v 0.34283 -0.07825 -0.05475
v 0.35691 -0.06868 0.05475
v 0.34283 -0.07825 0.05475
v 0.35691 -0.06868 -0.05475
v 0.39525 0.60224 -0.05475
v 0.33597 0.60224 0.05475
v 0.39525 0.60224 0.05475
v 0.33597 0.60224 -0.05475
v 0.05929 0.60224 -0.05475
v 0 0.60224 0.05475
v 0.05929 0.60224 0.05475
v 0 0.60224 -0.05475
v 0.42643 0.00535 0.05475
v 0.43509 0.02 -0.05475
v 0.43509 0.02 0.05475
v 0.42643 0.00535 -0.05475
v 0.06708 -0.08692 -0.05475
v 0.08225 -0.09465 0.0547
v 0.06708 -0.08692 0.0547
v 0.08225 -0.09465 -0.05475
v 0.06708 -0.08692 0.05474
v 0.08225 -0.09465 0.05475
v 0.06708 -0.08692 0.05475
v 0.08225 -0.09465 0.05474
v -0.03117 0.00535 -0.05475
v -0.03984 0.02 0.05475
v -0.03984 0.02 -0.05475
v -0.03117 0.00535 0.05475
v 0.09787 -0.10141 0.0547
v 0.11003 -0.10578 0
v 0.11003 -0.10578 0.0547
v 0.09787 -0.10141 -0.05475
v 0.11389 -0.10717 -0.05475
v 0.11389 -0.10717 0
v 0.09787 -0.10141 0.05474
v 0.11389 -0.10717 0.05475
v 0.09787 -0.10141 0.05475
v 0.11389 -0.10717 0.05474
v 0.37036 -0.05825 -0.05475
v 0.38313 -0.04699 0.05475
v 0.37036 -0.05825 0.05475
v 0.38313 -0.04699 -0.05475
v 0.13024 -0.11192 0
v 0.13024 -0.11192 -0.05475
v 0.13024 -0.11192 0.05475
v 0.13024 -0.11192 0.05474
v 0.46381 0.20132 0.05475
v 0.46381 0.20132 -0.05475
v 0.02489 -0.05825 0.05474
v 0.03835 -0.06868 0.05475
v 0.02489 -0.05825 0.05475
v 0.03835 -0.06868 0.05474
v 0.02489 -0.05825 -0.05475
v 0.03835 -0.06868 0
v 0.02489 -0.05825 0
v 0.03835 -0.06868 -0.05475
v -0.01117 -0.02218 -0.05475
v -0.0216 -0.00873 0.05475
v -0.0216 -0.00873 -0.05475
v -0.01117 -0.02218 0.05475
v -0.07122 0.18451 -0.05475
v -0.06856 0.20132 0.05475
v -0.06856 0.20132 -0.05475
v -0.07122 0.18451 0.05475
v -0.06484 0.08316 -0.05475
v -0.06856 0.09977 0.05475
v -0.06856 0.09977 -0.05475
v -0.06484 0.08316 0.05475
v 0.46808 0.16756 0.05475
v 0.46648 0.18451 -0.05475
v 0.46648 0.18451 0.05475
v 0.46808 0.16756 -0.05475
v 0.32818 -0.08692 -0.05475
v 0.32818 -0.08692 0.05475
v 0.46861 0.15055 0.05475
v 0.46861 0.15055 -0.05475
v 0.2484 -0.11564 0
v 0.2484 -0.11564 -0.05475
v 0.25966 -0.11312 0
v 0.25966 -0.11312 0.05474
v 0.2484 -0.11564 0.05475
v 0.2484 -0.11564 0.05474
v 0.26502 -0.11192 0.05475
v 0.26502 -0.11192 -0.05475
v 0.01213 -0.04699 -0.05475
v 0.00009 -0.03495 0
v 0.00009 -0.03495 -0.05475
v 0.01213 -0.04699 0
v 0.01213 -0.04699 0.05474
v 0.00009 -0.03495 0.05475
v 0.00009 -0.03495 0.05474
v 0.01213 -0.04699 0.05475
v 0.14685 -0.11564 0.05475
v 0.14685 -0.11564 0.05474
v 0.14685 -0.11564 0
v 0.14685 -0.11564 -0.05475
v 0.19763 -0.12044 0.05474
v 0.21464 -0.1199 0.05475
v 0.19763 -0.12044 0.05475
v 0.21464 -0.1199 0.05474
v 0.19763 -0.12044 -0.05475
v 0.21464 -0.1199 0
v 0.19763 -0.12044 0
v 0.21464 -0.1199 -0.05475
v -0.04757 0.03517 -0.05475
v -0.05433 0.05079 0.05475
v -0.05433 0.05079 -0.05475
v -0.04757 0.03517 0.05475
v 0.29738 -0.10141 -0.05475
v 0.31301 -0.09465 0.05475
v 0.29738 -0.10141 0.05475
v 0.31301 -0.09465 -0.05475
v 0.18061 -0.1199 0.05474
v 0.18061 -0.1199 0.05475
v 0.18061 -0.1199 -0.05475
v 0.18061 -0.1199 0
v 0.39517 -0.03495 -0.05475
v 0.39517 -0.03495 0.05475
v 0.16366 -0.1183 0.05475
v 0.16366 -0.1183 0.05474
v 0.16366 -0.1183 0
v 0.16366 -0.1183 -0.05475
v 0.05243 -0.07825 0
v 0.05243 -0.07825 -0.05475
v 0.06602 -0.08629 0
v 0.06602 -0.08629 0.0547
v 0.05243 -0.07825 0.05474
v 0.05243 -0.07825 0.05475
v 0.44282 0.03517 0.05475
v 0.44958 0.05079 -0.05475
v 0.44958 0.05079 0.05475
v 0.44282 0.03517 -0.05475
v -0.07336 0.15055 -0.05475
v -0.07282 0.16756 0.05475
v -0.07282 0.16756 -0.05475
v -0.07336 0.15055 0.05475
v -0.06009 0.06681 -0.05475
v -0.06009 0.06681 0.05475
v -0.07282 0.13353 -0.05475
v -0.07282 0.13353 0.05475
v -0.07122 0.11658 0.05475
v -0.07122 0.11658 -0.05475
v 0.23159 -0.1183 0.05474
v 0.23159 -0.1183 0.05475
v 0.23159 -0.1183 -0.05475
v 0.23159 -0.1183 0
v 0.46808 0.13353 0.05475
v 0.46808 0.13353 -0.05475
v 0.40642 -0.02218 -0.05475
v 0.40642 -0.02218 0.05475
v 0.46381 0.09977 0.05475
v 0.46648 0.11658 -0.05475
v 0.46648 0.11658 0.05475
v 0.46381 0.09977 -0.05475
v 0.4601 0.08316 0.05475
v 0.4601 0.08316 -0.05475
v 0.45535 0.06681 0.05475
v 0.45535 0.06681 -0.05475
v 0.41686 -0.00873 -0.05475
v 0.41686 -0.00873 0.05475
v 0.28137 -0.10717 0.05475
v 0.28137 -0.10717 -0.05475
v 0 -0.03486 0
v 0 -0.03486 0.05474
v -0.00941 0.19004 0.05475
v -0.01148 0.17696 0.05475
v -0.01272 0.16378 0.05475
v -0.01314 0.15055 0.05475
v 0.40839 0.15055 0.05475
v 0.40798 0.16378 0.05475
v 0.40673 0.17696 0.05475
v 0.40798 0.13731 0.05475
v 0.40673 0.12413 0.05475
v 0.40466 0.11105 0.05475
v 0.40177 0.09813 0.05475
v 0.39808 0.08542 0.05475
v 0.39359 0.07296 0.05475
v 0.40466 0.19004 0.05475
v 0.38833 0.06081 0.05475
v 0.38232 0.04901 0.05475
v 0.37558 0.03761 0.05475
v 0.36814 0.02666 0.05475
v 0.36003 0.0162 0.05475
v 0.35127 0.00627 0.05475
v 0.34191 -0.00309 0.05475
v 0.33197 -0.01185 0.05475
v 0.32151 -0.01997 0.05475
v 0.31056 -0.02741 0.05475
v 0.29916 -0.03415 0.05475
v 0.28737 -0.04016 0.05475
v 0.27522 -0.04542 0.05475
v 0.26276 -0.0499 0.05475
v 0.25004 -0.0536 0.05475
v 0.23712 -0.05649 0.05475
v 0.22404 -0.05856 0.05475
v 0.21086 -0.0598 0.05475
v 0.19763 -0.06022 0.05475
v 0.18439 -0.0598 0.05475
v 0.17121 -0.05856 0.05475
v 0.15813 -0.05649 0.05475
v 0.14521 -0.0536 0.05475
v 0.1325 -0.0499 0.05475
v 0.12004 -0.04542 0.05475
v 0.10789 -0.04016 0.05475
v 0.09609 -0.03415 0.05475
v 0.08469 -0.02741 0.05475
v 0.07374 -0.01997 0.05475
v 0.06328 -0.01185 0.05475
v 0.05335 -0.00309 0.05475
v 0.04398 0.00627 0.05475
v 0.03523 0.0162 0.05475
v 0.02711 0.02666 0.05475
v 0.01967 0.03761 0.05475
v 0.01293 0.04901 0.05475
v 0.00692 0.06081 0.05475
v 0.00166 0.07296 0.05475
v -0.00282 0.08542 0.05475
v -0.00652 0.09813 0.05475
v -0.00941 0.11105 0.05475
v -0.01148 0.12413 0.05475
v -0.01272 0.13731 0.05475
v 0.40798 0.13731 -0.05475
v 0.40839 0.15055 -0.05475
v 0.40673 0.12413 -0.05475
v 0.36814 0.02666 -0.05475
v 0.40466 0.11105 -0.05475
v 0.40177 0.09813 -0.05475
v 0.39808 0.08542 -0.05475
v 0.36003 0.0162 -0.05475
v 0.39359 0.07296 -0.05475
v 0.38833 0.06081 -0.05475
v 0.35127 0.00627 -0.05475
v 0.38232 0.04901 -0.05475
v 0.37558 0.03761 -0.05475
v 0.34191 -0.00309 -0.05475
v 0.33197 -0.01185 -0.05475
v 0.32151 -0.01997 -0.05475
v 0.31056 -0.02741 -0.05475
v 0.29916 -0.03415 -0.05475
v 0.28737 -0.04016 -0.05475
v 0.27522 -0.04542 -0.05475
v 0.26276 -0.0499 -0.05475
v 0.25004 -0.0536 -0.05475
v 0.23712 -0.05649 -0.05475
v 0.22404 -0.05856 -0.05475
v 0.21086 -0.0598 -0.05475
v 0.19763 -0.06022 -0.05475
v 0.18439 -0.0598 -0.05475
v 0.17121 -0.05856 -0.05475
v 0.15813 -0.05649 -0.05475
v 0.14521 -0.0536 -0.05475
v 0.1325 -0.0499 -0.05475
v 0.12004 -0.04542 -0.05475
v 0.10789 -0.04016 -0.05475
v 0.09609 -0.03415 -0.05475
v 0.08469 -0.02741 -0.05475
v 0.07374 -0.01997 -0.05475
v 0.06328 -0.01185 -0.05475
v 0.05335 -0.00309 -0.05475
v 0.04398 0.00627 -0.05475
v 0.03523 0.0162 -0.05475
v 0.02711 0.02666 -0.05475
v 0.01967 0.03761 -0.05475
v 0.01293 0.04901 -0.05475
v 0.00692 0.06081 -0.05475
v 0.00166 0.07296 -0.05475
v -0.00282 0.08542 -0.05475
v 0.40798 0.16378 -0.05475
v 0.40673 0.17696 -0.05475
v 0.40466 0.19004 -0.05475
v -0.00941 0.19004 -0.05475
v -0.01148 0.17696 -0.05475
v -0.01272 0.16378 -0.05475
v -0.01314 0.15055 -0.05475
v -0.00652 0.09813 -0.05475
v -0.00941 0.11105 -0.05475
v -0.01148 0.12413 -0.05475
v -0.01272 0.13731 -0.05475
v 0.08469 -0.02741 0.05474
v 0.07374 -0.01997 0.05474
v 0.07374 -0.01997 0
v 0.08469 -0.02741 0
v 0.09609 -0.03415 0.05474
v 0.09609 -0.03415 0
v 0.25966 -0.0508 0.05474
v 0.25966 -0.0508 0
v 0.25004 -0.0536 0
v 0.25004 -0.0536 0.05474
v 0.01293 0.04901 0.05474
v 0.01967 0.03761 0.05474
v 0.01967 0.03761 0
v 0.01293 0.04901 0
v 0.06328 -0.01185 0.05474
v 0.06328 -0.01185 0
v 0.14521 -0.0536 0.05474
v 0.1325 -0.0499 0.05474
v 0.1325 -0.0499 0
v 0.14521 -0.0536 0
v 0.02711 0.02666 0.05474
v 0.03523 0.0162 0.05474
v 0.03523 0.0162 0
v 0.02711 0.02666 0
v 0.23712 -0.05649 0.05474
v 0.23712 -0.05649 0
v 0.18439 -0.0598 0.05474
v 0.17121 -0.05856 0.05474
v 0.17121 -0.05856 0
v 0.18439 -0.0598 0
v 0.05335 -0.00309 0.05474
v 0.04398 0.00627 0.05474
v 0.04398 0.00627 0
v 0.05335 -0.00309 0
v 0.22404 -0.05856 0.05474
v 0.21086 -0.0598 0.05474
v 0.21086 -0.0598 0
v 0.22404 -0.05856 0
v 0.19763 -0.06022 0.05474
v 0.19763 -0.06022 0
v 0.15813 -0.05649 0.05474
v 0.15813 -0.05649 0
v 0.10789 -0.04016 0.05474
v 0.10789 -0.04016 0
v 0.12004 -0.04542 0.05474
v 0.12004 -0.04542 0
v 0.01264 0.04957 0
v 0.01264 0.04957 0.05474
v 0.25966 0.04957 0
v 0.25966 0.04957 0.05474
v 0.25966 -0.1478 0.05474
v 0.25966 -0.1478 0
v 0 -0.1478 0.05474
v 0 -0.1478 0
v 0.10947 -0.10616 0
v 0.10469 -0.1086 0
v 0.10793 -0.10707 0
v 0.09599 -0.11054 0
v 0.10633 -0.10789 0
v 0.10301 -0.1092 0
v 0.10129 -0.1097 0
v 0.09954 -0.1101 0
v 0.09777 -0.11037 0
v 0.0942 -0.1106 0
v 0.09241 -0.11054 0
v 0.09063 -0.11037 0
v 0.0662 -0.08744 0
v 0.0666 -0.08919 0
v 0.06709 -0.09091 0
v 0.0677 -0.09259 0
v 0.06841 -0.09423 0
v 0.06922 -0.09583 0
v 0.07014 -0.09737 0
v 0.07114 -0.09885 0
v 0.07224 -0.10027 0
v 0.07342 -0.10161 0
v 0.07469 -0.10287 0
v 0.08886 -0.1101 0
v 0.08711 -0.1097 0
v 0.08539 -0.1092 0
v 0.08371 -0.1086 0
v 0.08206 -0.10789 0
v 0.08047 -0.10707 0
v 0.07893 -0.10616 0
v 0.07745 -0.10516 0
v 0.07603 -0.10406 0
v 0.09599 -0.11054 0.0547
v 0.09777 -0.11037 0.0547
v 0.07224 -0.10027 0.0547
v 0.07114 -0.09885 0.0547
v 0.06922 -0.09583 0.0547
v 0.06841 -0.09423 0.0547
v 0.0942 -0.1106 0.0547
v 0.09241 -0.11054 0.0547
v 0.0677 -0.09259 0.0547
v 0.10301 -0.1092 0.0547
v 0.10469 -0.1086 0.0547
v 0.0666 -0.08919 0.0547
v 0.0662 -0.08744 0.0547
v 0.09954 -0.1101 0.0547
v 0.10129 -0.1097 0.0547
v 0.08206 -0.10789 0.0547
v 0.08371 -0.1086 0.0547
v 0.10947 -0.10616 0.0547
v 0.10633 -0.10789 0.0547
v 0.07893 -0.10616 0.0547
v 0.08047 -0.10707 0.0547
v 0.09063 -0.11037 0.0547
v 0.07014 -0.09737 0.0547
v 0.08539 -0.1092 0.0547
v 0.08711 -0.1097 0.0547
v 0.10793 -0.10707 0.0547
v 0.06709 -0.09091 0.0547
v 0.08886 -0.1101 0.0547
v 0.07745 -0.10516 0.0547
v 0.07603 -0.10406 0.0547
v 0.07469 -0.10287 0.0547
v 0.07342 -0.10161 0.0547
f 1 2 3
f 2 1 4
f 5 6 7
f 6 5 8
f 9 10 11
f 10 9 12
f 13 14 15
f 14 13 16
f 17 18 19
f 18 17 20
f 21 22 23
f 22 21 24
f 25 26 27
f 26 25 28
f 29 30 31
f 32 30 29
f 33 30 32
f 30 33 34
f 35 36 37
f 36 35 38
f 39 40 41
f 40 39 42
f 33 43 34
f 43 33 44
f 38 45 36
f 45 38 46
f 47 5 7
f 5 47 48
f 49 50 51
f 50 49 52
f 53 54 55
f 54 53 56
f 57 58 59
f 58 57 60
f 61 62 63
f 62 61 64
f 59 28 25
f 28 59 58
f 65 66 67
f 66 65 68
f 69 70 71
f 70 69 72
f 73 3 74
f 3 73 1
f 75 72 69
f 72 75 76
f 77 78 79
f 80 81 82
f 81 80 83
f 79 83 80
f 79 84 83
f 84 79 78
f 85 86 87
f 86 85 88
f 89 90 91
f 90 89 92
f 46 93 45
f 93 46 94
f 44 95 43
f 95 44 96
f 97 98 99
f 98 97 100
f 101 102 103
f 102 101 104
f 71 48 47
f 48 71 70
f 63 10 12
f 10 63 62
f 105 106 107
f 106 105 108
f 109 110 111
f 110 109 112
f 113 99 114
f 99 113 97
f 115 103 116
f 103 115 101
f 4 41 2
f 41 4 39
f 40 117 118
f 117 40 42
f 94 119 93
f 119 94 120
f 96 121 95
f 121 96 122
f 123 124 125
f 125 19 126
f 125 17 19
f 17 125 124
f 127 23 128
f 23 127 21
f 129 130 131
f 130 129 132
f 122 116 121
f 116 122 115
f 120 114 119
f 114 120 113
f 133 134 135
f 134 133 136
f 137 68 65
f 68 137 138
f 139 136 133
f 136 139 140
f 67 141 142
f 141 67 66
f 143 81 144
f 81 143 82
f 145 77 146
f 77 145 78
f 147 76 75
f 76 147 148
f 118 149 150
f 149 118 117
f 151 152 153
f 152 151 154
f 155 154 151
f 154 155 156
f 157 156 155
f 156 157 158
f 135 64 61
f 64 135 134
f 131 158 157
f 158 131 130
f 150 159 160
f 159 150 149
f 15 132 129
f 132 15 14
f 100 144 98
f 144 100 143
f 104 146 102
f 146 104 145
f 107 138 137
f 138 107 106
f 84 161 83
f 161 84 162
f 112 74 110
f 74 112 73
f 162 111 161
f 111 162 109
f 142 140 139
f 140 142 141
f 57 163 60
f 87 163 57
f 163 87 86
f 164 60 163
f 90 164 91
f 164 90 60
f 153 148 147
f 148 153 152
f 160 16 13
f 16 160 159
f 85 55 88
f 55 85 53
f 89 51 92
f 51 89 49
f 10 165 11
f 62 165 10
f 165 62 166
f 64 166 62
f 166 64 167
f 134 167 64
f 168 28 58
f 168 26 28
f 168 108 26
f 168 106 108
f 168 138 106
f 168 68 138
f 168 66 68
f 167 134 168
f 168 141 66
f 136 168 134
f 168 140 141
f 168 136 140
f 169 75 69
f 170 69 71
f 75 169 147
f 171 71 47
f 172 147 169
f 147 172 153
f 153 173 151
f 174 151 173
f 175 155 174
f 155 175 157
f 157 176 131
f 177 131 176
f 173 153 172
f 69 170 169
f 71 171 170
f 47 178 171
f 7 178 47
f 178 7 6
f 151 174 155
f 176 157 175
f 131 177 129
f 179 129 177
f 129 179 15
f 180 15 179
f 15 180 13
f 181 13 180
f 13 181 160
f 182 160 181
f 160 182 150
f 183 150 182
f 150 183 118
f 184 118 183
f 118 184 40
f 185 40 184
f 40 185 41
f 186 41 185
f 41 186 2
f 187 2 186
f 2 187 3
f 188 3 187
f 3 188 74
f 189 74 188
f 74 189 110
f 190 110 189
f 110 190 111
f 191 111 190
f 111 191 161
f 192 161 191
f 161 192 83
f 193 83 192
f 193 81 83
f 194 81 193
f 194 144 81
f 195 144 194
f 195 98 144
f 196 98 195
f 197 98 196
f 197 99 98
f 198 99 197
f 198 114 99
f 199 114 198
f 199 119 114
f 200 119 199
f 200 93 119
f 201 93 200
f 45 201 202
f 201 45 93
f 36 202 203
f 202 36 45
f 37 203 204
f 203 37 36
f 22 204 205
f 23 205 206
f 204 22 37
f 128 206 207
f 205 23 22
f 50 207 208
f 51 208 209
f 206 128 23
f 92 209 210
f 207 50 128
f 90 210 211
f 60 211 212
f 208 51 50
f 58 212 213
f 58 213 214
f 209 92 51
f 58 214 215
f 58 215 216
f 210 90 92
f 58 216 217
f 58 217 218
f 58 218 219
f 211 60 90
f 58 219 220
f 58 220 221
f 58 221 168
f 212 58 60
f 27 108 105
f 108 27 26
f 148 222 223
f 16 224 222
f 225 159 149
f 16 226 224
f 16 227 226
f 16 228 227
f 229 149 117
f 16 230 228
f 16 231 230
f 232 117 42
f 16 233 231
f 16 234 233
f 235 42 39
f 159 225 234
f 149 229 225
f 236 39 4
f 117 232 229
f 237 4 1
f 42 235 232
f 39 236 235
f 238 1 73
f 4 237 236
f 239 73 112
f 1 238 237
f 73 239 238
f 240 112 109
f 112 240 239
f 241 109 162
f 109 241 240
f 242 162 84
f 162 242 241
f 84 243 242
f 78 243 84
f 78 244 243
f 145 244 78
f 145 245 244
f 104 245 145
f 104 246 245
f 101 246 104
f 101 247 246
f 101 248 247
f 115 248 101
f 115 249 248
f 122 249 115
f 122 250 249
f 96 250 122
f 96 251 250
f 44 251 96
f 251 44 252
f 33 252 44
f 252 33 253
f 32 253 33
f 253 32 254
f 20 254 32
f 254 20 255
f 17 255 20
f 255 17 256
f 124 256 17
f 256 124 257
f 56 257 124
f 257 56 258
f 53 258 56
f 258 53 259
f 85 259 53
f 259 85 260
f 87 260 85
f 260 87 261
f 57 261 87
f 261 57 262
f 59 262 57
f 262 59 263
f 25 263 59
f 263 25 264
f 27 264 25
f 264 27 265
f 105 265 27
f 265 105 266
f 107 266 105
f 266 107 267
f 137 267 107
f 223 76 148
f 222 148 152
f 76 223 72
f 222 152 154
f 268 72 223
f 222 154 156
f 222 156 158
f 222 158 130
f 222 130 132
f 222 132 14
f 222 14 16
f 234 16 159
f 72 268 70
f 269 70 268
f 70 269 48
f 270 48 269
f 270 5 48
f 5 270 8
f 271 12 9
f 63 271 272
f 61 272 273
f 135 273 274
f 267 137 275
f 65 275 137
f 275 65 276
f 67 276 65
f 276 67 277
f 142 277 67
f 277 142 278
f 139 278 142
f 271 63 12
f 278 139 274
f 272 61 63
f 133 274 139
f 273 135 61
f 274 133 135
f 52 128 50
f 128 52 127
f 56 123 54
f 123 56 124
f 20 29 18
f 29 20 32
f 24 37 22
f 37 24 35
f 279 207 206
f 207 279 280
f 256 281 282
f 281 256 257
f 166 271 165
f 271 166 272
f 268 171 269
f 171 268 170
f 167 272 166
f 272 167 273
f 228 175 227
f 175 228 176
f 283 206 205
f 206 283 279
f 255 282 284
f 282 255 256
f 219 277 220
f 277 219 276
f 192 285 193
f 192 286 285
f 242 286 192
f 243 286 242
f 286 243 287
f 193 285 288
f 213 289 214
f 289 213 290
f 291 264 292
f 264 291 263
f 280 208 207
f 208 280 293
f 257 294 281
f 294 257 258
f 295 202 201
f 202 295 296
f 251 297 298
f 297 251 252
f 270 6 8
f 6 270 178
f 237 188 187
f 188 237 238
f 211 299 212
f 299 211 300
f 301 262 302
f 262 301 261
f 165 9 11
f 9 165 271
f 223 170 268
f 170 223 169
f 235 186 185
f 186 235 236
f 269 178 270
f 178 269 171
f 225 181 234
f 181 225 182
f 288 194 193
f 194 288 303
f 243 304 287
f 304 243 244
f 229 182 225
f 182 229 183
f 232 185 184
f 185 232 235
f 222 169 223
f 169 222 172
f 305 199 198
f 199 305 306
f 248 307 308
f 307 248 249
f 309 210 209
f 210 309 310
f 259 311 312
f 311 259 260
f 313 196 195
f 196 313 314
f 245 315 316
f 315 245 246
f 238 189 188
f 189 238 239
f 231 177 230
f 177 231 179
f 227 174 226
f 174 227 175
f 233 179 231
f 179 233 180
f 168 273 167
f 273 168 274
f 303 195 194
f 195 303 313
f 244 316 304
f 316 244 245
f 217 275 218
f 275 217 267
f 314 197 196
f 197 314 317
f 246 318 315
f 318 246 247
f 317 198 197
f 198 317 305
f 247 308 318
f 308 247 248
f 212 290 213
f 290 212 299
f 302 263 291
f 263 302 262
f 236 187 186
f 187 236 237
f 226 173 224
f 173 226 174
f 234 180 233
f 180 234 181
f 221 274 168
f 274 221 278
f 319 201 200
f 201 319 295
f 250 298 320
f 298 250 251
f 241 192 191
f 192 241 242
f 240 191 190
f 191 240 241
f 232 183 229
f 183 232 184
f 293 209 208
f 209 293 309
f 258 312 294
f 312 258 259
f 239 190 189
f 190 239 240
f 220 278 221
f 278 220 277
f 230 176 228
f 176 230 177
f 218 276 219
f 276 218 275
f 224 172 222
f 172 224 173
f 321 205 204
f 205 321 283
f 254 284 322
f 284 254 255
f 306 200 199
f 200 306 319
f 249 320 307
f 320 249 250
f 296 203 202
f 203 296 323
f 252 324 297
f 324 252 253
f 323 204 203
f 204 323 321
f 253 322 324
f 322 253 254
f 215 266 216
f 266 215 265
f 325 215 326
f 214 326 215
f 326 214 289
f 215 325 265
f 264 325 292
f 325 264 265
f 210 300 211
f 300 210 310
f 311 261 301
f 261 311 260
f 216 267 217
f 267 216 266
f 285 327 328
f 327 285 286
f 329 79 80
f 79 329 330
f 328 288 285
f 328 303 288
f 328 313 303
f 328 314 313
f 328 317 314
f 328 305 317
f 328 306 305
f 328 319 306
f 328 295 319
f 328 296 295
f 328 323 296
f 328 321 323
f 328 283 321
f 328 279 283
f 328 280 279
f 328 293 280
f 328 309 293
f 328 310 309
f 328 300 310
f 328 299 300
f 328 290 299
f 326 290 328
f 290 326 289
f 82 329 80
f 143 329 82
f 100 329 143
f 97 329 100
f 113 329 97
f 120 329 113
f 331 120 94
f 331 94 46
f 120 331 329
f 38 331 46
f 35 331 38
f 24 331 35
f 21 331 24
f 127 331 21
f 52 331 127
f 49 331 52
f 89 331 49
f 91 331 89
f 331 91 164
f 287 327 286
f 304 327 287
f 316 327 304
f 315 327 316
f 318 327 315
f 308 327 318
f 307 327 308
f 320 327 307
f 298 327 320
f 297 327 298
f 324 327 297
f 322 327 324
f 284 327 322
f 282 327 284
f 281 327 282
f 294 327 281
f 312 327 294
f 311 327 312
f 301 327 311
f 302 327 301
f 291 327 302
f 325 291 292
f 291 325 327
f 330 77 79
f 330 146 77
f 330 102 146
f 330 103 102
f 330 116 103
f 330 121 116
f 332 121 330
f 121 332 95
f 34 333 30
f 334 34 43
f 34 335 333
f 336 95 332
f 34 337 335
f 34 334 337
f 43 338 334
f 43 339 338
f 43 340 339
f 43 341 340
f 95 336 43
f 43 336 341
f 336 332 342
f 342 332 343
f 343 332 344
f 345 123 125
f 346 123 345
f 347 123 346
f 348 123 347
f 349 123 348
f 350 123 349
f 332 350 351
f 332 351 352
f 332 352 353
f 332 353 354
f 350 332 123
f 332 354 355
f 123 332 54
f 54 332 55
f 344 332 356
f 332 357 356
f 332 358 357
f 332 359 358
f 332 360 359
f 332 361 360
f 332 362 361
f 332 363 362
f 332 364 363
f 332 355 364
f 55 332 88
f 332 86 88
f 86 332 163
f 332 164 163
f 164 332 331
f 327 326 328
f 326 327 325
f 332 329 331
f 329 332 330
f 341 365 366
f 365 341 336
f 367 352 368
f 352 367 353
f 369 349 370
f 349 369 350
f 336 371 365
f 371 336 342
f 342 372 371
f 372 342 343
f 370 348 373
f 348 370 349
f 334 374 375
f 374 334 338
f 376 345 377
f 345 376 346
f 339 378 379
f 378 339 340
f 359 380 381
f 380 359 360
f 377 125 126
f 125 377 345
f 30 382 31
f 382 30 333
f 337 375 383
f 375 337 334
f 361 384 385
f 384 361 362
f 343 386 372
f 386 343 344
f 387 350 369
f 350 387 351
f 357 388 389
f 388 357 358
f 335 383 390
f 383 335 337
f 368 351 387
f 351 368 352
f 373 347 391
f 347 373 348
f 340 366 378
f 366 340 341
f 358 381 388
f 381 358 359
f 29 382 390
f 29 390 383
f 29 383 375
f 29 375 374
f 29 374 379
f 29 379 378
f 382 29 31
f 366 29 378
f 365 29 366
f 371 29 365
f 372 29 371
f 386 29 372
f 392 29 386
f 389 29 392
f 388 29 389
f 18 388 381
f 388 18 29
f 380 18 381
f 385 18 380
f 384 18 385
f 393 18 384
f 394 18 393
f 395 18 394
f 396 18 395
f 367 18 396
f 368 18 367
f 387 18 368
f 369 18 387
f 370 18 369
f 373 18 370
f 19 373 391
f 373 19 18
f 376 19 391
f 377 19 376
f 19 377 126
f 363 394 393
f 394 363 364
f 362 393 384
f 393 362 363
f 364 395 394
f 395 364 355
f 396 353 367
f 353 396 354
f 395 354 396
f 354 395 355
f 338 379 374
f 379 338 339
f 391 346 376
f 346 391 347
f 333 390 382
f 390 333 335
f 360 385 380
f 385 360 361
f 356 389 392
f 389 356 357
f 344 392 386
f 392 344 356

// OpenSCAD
// Parametric D-Frame with Round Protrusion
// All dimensions in millimeters

// Main frame parameters
frame_length = 0.395255;
frame_width = 0.60219;
frame_height = 0.109489;
extrusion_depth = 0.1095;

// Round protrusion parameters
protrusion_length = 0.259658;
protrusion_width = 0.197373;
protrusion_height = 0.054745;
protrusion_left_offset = 0;
protrusion_right_offset = 0.1356;
protrusion_front_offset = -0.1478;
protrusion_back_offset = 0.5526;

// Round tab parameters
tab_axis_left = 0.0942;
tab_axis_front = -0.0821;
tab_radius = 0.0657;
tab_height = 0.0547;

// Cut parameters
cut_radius = 0.0285;
cut_bounding_length = 0.056934;
cut_bounding_width = 0.056934;
cut_z_start = 0;
cut_z_end = 0.0547;

// Resolution
$fn = 100;

// Helper module: D-shaped frame
module d_frame() {
    difference() {
        // Outer D-shape
        hull() {
            // Straight rear section
            translate([frame_length/2, frame_width, 0])
                cube([frame_length, 0.0001, extrusion_depth], center=true);
            // Rounded front arc
            translate([frame_length/2, frame_width*0.25, 0])
                cylinder(h=extrusion_depth, r=frame_width*0.45, center=true);
        }
        
        // Inner through-opening
        hull() {
            translate([frame_length/2, frame_width, 0])
                cube([frame_length*0.7, 0.0001, extrusion_depth+1], center=true);
            translate([frame_length/2, frame_width*0.25, 0])
                cylinder(h=extrusion_depth+1, r=frame_width*0.35, center=true);
        }
    }
}

// Helper module: Round protrusion base
module protrusion_base() {
    translate([protrusion_left_offset, protrusion_front_offset, 0])
        cube([protrusion_length, protrusion_width, protrusion_height]);
}

// Helper module: Round tab
module round_tab() {
    translate([tab_axis_left, tab_axis_front, 0])
        cylinder(h=tab_height, r=tab_radius);
}

// Helper module: Concentric cut
module concentric_cut() {
    translate([tab_axis_left, tab_axis_front, cut_z_start])
        cylinder(h=cut_z_end - cut_z_start, r=cut_radius);
}

// Main assembly
union() {
    // Main D-shaped frame
    d_frame();
    
    // Round protrusion with tab
    difference() {
        union() {
            protrusion_base();
            round_tab();
        }
        concentric_cut();
    }
}
